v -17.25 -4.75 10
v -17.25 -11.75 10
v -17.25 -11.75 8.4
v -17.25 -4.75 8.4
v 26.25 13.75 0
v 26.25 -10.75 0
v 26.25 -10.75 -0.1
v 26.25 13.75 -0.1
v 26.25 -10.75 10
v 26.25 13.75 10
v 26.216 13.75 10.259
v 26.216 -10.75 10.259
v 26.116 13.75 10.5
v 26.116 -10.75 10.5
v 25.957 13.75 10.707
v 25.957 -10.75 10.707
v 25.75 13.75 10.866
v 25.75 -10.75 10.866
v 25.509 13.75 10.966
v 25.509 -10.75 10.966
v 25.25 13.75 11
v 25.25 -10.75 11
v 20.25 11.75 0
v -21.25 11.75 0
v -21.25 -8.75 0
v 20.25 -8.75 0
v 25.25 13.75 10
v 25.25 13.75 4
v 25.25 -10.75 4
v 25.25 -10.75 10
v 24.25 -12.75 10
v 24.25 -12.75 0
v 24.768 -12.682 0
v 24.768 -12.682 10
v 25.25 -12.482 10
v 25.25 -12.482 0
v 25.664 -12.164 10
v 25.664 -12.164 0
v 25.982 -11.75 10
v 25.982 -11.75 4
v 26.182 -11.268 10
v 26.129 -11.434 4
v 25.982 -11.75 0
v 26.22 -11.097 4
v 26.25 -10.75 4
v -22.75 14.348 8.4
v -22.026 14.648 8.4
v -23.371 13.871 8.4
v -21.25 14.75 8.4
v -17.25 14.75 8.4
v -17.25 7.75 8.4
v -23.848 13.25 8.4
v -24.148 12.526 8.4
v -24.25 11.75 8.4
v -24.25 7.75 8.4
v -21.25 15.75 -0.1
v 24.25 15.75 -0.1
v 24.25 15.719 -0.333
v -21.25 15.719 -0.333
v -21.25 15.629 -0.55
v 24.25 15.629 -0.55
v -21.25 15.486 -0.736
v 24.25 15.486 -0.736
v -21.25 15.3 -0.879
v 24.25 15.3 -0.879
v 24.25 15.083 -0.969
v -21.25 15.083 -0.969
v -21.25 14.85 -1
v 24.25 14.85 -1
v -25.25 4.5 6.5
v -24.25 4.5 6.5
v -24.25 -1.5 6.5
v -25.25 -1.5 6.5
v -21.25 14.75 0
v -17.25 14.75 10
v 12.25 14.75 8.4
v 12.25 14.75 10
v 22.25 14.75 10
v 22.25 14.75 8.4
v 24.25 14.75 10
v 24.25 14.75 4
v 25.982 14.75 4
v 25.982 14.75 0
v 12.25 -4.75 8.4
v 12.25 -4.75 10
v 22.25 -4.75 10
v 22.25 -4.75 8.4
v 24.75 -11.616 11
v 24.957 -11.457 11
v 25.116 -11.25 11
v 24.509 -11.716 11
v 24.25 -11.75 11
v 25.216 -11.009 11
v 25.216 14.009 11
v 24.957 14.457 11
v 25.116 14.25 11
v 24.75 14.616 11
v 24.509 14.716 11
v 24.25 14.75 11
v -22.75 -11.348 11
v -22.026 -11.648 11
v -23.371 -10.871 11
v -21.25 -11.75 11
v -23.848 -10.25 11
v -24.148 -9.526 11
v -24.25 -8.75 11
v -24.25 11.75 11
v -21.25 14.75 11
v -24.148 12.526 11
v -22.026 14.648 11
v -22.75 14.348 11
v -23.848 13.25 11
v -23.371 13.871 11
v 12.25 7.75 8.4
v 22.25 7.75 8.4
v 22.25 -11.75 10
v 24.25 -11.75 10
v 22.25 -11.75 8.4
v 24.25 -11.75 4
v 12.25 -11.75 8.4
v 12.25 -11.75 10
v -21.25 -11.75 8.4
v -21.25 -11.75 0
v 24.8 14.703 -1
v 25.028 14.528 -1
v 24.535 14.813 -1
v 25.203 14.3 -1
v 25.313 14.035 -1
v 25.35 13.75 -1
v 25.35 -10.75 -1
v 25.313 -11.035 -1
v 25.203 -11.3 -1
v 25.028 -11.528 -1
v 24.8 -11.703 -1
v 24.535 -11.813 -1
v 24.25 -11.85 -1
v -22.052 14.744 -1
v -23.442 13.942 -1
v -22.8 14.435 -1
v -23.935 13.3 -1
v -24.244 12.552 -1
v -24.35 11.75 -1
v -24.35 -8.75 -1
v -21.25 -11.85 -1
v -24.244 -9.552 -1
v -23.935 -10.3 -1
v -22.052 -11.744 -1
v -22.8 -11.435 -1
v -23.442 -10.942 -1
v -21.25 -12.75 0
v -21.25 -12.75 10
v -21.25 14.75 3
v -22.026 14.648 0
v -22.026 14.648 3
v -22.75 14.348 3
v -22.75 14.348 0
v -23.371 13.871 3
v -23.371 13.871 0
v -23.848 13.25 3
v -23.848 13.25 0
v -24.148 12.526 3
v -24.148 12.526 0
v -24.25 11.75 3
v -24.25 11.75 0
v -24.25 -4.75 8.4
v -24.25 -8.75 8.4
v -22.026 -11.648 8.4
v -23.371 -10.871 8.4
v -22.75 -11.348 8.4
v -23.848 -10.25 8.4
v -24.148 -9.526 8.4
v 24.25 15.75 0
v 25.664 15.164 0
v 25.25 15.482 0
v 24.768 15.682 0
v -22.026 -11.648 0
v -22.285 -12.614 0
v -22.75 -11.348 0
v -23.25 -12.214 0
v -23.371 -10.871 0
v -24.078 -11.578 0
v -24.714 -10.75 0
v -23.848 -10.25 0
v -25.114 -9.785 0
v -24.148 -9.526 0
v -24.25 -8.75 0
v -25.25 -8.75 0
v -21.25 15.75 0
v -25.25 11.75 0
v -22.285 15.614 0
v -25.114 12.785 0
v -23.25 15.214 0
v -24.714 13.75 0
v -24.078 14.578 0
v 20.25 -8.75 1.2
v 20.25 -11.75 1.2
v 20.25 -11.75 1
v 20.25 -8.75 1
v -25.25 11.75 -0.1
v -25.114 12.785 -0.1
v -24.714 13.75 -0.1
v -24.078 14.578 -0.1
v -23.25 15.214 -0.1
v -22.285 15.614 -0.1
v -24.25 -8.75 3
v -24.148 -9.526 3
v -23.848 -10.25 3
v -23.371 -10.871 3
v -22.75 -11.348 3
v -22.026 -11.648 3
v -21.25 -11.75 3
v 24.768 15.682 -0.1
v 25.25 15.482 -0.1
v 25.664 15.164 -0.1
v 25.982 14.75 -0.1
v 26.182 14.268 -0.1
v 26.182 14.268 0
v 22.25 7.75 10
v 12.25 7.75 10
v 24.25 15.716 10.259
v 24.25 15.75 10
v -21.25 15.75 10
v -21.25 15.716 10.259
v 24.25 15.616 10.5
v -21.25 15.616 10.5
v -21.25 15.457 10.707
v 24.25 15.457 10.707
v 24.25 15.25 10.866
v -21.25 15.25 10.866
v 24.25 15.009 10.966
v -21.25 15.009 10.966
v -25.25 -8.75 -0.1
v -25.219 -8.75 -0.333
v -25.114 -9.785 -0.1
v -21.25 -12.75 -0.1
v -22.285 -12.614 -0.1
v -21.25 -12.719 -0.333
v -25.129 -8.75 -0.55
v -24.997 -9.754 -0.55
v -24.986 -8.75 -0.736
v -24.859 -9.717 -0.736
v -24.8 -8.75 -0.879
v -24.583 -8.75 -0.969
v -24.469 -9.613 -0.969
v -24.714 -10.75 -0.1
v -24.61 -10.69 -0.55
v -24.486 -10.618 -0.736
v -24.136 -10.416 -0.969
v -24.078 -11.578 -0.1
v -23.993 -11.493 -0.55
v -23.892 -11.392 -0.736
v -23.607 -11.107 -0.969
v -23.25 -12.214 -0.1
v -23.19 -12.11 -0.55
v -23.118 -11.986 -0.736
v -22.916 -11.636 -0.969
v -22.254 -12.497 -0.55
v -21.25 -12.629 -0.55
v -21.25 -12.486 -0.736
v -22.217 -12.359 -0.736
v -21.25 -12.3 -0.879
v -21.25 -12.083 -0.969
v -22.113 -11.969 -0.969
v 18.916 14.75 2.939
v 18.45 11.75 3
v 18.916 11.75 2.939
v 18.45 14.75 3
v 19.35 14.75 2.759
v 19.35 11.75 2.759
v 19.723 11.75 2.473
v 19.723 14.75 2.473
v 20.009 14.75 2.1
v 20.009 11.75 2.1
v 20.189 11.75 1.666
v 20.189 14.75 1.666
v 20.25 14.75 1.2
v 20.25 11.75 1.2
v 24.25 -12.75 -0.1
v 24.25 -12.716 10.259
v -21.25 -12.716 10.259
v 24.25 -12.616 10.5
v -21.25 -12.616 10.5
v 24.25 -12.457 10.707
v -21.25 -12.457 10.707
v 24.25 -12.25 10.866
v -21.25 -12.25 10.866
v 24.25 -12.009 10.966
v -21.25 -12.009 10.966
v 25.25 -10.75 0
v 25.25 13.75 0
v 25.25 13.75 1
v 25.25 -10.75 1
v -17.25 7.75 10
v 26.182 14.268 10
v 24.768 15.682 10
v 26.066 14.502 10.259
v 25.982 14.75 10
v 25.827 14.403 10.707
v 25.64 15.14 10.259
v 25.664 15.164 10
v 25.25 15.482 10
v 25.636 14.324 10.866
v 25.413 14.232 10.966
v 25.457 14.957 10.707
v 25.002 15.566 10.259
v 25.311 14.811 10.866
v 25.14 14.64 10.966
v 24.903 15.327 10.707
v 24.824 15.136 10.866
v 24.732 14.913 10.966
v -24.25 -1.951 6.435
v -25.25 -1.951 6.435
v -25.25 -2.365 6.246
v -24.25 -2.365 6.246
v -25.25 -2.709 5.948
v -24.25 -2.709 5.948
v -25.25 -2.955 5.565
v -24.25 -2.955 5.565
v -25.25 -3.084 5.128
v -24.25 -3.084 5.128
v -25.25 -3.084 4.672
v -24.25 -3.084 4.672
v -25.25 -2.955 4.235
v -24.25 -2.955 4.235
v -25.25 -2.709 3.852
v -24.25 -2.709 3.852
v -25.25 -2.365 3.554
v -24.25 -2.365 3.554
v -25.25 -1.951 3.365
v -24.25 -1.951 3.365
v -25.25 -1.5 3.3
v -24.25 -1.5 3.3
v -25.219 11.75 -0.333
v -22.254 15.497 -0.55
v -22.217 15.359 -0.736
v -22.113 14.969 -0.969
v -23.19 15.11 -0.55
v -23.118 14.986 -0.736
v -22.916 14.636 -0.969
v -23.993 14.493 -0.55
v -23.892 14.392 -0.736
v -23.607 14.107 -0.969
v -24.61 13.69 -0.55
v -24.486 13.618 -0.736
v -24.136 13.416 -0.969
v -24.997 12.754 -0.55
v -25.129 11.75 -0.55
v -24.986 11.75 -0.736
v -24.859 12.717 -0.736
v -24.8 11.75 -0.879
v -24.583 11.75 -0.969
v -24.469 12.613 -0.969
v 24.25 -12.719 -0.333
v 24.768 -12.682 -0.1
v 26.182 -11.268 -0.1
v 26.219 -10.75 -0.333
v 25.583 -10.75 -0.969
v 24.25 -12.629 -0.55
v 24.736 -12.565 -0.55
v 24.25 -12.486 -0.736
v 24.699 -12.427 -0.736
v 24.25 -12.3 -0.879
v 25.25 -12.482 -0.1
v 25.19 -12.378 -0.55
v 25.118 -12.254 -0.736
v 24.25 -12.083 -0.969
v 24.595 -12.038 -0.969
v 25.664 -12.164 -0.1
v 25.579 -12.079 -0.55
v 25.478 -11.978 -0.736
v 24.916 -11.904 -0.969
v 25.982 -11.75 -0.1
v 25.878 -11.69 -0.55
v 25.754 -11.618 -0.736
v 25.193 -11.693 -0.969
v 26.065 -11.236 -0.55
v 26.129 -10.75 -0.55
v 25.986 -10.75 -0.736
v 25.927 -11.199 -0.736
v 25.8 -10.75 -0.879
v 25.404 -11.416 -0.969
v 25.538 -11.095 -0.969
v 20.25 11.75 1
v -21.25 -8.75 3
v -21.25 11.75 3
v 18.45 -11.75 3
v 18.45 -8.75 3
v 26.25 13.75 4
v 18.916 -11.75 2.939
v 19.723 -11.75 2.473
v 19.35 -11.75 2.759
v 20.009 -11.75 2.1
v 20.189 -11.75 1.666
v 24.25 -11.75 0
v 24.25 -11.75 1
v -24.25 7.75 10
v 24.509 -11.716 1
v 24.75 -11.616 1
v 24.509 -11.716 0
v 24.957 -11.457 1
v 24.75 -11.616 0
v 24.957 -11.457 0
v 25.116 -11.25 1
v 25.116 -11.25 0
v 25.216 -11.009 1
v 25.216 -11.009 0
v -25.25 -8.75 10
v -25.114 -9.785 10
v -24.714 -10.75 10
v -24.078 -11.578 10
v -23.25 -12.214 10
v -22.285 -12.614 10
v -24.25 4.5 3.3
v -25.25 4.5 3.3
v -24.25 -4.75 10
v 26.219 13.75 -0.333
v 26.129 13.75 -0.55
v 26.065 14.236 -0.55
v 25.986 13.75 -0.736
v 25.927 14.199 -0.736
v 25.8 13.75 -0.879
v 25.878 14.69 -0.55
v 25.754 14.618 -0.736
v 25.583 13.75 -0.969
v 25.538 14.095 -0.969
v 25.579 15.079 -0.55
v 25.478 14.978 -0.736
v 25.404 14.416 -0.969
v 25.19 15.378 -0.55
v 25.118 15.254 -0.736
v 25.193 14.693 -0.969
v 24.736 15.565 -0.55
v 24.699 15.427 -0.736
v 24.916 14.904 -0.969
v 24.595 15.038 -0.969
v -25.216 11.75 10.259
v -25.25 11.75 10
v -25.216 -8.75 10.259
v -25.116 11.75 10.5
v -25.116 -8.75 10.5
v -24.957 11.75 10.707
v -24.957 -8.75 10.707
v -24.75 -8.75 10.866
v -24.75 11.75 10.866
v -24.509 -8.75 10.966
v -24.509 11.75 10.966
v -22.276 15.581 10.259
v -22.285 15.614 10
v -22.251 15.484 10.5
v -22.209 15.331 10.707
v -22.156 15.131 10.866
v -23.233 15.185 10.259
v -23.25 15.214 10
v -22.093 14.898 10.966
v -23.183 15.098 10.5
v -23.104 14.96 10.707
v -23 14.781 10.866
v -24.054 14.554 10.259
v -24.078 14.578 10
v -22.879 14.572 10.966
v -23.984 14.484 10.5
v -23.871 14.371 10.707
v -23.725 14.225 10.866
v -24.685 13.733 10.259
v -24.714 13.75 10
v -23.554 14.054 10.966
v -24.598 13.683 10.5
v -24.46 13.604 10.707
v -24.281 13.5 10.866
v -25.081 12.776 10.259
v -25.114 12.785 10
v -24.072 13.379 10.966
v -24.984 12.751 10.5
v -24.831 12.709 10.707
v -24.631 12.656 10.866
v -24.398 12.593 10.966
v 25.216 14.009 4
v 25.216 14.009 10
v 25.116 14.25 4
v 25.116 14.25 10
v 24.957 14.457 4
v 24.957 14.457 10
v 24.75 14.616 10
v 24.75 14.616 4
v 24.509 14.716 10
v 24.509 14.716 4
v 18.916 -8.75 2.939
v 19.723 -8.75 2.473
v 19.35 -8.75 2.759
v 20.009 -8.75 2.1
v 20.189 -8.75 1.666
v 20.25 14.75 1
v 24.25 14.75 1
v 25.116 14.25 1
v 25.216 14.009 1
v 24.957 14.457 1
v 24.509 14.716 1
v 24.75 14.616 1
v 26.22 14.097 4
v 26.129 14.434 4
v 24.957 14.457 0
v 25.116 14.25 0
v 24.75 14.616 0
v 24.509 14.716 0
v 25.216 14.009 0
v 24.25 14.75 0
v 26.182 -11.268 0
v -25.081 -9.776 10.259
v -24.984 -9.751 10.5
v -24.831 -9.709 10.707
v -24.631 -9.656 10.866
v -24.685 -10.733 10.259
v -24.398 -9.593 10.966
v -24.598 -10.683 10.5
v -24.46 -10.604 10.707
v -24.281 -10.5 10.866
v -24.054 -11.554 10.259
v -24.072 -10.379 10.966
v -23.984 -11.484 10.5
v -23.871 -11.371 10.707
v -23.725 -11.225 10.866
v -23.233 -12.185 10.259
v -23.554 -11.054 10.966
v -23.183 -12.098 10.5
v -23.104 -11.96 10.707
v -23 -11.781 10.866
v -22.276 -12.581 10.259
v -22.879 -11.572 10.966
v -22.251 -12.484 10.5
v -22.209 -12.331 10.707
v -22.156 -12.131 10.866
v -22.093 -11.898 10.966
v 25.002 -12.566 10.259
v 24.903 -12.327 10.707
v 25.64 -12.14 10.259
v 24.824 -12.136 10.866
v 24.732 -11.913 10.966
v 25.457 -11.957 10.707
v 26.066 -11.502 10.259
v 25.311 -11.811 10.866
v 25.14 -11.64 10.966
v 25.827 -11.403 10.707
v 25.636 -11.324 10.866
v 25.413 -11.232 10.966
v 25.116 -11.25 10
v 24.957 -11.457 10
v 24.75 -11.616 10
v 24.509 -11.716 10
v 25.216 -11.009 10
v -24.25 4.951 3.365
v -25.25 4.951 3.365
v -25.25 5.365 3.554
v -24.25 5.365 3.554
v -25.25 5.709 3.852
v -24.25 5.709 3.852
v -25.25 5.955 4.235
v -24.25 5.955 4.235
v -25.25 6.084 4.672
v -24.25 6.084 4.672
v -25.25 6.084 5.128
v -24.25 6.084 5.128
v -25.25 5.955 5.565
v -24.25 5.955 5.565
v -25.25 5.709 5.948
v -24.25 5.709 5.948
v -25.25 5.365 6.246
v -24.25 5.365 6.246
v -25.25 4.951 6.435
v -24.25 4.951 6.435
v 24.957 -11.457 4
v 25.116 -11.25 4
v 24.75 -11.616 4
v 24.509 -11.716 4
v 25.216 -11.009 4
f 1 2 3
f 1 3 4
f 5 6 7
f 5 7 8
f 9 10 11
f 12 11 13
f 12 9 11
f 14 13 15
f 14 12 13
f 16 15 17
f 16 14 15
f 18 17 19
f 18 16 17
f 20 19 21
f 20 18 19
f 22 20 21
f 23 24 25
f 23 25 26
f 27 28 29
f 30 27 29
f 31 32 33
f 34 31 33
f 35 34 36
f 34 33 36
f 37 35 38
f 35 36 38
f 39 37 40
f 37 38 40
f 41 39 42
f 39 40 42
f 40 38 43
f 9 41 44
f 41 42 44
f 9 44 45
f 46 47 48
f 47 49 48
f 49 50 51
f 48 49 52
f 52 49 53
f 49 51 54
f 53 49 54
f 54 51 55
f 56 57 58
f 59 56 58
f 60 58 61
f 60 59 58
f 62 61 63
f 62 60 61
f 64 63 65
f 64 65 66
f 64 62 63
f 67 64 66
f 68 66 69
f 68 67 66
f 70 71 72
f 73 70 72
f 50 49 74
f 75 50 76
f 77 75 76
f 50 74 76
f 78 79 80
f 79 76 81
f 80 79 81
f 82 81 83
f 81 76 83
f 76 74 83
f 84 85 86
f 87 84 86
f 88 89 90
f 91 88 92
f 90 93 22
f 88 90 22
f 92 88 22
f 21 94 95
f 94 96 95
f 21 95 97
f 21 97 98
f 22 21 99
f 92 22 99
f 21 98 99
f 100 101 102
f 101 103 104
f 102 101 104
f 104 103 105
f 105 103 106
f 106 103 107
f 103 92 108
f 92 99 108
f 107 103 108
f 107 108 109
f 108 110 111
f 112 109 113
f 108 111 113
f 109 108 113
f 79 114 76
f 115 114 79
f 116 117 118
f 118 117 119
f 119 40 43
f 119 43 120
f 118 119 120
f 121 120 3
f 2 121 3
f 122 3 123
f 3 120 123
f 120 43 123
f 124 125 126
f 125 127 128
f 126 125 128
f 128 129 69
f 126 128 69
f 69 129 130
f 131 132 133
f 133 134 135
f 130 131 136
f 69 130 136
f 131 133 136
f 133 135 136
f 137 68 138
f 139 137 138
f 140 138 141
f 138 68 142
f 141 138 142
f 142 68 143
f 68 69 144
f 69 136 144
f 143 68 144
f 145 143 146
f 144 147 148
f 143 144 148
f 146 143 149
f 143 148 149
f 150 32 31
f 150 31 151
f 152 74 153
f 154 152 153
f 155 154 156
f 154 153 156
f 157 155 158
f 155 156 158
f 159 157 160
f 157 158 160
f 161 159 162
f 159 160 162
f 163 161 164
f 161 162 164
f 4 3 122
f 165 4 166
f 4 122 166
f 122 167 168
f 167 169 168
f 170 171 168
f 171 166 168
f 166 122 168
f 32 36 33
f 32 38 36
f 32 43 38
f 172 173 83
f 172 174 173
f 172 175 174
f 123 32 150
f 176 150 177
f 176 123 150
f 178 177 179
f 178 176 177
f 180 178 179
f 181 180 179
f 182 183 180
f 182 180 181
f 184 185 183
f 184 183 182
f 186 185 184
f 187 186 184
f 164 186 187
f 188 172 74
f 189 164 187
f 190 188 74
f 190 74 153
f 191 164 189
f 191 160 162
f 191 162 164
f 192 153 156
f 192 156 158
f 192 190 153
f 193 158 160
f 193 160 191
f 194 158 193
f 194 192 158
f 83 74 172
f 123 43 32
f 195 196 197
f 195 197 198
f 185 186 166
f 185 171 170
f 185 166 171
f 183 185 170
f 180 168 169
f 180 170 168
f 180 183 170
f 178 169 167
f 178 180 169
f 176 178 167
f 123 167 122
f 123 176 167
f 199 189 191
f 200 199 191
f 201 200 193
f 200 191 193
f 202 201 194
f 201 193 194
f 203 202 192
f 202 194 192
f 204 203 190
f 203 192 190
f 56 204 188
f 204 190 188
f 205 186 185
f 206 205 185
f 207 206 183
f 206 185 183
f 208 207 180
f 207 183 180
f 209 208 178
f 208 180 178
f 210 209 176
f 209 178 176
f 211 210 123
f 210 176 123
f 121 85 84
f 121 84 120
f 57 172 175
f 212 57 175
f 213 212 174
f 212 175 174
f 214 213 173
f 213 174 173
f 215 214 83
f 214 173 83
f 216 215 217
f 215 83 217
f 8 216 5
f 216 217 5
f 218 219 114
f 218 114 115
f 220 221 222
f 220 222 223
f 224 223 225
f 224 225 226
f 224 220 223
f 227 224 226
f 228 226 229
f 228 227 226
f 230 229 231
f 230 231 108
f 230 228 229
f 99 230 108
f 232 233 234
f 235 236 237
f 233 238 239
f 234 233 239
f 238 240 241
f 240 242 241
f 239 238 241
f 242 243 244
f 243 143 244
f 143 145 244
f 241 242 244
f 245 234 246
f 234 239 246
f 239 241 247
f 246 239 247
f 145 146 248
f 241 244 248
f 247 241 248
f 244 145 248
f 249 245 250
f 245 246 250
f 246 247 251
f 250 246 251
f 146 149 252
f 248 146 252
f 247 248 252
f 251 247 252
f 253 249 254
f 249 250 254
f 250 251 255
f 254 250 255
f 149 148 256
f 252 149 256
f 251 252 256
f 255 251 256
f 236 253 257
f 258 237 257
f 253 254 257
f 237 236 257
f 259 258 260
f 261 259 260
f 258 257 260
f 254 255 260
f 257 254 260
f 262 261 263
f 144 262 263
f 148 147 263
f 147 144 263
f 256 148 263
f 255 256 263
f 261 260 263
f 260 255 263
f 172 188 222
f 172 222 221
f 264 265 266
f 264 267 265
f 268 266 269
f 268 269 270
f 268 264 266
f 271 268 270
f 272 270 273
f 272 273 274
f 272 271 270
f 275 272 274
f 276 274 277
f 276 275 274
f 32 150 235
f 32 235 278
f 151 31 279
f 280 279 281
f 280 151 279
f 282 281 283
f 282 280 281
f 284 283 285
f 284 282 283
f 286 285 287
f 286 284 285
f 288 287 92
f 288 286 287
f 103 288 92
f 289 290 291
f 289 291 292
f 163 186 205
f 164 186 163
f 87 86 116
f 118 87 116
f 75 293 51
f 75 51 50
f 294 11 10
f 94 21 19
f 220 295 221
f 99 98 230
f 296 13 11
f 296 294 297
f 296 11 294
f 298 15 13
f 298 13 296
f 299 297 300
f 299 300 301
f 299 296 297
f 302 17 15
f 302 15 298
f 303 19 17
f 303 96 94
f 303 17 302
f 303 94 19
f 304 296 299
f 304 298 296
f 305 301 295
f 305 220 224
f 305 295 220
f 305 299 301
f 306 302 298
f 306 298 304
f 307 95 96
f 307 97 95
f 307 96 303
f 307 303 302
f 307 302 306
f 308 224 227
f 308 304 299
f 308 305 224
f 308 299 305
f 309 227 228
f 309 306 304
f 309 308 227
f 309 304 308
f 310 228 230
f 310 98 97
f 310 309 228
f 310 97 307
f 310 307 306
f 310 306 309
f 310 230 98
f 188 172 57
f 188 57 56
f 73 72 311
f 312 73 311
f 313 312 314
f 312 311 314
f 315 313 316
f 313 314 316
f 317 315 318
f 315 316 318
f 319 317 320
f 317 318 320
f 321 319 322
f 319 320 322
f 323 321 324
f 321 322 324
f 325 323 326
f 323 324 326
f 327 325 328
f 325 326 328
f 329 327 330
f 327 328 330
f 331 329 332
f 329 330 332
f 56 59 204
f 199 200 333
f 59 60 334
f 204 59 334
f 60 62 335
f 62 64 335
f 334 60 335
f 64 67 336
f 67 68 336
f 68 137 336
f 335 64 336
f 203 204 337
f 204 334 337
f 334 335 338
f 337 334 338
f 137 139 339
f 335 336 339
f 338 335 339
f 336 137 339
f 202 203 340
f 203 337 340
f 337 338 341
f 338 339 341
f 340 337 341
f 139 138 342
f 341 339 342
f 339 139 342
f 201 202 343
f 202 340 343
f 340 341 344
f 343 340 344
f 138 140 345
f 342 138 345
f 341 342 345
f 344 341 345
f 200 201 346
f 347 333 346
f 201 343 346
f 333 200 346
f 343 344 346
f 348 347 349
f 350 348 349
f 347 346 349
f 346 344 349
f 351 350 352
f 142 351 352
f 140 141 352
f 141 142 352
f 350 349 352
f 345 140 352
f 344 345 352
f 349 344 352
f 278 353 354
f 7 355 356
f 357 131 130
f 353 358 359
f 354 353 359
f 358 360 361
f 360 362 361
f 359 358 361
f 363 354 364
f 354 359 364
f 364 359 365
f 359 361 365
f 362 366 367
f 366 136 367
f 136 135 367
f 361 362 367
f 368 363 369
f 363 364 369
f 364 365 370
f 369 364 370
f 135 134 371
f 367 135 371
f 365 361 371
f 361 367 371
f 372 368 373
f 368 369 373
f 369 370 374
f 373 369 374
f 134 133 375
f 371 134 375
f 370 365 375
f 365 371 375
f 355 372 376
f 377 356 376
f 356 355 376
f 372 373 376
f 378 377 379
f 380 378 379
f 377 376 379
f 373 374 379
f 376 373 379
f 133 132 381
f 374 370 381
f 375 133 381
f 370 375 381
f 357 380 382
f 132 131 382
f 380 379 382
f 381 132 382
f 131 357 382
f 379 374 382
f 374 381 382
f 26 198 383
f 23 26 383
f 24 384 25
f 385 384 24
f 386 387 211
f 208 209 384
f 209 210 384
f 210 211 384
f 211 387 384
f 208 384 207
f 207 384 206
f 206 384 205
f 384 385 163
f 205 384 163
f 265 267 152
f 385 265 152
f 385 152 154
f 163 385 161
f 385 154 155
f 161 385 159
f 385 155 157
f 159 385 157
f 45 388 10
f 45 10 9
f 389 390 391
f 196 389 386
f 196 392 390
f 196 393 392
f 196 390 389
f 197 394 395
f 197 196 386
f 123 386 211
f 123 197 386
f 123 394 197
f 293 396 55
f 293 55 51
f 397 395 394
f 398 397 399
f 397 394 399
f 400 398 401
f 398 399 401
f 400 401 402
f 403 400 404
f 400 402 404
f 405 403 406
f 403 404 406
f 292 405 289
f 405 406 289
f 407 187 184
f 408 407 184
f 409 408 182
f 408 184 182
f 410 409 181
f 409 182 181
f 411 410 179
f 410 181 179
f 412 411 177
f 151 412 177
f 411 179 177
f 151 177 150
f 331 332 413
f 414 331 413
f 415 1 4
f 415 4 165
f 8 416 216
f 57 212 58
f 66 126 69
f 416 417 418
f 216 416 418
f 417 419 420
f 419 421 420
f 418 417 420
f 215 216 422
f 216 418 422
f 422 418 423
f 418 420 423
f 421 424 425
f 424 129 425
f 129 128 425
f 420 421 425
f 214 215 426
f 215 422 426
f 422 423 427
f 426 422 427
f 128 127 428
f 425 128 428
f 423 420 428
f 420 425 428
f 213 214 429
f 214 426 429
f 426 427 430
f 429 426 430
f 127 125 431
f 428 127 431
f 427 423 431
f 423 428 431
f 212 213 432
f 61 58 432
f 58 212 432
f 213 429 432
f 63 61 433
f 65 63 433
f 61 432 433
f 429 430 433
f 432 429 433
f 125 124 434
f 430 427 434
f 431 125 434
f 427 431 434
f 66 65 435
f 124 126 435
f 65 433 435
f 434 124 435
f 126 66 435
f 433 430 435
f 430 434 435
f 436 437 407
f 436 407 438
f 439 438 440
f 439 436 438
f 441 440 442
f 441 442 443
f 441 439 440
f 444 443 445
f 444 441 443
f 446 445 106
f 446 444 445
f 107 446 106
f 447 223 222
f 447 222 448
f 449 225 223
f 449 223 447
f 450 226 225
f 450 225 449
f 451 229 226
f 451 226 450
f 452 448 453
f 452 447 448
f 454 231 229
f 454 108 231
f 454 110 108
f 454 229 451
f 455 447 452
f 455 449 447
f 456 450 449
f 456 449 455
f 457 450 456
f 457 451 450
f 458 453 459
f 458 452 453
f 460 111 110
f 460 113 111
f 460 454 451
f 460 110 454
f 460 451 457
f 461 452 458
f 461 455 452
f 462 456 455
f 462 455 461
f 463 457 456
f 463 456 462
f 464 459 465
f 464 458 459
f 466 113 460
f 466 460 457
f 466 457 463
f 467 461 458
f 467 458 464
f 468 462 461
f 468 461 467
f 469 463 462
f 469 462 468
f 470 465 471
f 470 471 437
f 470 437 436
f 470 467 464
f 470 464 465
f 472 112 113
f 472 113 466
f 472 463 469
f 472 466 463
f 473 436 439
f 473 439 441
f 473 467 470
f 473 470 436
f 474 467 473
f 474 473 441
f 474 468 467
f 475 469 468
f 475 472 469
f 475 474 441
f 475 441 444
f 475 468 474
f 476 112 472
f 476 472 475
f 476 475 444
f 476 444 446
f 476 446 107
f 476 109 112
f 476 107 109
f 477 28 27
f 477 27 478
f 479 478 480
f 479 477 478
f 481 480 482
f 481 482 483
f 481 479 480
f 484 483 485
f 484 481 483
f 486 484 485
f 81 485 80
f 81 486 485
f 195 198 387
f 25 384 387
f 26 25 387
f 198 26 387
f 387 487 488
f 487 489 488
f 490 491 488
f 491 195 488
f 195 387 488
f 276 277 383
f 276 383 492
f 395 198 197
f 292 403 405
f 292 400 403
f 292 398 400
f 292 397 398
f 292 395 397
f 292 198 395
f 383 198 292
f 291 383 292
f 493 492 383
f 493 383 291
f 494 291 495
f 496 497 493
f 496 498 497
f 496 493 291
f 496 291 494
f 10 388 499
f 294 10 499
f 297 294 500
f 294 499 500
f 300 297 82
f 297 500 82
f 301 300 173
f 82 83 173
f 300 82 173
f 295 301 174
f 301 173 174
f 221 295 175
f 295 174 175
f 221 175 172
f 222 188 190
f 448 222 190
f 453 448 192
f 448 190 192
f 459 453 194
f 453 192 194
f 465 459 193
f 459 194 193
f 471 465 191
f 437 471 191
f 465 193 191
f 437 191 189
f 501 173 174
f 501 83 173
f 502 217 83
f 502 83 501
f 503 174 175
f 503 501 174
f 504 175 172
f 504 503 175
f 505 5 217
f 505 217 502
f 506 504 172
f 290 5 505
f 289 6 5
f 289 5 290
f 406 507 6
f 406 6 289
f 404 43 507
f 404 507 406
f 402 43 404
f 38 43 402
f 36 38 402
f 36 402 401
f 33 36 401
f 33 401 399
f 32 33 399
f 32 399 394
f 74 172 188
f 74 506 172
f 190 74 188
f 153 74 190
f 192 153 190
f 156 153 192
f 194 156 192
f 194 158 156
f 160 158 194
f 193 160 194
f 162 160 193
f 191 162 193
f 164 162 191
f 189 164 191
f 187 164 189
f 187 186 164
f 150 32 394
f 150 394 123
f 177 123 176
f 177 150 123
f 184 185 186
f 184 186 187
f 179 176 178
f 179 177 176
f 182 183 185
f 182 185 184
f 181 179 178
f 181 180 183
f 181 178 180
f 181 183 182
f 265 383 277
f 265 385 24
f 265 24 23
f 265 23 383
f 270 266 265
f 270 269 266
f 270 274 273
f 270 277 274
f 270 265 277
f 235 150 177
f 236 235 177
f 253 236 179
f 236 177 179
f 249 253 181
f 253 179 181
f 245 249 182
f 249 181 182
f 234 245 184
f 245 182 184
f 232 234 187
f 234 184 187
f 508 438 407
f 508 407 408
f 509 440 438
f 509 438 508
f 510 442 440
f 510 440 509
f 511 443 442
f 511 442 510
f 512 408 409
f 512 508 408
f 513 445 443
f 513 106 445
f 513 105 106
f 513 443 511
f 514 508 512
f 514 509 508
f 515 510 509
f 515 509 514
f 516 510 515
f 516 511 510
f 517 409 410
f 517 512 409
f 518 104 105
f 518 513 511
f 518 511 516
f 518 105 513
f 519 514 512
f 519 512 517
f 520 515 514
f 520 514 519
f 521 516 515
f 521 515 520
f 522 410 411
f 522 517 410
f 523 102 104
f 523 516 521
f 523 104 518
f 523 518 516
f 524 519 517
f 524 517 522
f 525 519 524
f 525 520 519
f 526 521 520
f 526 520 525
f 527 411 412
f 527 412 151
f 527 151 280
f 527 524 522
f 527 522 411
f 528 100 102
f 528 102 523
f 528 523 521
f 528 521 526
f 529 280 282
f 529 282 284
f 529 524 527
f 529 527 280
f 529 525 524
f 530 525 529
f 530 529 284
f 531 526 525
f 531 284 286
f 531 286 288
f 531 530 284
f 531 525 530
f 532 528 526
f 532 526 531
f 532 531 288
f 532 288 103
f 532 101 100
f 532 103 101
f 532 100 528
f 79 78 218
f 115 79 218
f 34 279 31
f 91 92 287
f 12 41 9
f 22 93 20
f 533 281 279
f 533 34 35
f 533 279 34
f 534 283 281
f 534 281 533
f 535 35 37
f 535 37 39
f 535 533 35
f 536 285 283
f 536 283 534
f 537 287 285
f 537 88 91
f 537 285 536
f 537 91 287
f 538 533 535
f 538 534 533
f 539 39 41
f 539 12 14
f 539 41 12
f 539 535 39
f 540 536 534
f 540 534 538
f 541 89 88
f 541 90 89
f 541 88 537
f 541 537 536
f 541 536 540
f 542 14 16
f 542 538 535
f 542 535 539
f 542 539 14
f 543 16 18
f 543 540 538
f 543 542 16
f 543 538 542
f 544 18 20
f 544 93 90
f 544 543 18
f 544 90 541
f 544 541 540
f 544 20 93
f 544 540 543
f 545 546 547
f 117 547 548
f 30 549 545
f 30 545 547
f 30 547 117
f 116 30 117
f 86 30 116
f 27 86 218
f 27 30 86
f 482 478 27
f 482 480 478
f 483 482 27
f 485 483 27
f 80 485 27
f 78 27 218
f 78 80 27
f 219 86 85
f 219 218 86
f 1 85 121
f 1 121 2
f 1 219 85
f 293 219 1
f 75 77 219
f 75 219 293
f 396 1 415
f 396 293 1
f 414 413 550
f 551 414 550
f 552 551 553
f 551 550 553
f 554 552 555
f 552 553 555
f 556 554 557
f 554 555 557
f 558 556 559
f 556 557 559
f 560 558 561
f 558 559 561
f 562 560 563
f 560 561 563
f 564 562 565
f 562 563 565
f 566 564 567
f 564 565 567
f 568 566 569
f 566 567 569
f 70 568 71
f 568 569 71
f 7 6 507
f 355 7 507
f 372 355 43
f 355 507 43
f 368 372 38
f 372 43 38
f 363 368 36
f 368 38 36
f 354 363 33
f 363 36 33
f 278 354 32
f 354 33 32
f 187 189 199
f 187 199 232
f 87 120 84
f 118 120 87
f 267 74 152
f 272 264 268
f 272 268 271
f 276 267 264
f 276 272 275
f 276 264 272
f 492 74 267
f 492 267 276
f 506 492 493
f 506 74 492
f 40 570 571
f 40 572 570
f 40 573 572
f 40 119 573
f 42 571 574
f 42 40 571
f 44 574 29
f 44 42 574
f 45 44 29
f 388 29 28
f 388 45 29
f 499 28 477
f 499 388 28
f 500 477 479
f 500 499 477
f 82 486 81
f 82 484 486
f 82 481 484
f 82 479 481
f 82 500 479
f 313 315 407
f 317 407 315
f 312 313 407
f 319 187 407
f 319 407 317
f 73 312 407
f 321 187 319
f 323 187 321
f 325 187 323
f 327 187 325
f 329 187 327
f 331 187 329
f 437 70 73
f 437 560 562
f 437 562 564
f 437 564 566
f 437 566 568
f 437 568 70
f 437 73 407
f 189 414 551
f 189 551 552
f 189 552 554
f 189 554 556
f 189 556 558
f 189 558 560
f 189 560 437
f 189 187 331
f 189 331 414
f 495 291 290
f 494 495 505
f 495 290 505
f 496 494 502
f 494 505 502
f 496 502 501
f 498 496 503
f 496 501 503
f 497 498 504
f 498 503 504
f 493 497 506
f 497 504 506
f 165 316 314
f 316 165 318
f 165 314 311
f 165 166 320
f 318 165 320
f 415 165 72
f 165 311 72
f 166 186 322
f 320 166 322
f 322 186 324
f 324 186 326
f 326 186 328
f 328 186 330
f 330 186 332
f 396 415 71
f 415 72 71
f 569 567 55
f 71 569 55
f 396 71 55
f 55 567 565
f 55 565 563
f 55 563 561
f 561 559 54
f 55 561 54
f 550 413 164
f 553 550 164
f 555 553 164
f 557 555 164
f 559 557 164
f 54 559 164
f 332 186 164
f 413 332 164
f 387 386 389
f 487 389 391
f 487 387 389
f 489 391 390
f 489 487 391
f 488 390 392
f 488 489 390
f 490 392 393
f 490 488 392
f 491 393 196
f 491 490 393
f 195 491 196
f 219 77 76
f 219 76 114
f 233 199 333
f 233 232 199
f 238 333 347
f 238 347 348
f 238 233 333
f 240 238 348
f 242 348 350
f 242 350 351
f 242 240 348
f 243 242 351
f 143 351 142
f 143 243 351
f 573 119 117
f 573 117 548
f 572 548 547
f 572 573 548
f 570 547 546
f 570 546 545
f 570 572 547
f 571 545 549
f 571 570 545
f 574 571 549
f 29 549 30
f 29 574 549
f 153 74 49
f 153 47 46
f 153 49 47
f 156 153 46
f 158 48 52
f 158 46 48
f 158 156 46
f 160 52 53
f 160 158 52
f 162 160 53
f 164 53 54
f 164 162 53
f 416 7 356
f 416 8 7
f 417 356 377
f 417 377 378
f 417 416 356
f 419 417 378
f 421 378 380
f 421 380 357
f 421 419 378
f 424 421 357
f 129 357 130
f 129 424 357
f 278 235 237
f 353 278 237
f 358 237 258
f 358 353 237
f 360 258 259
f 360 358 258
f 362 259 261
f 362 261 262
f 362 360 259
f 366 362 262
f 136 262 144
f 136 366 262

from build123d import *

# Parameters (mm, degrees)
PAD_DEPTH       = 10
THICKNESS_T     = 1
SKETCH001_W     = 10
SKETCH001_H     = 7
PAD001_DEPTH    = 1.6
SKETCH002_W     = 24.5
SKETCH002_H     = 4
POCKET_DEPTH    = 1
POCKET001_DEPTH = 5
SKETCH006_W     = 26.5
SKETCH006_H     = 4
POCKET002_DEPTH = 5
PAD002_DEPTH    = 3
PAD003_DEPTH    = 1
SKETCH007_W     = 41.5
SKETCH007_H     = 20.5
POCKET003_DEPTH = 3
SKETCH008_W     = 5
SKETCH008_H     = 26.5
POCKET004_DEPTH = 2
FILLET_R        = 1.8
FILLET001_R     = 0.9


with BuildPart() as bottom:
    # Sketch → Pad (new body)
    with BuildSketch(Plane.XY):
        with BuildLine():
            Line((-21.25, 14.75), (24.25, 14.75))
            ThreePointArc((25.25, 13.75), (24.957107, 14.457107), (24.25, 14.75))
            Line((25.25, 13.75), (25.25, -10.75))
            ThreePointArc((24.25, -11.75), (24.957107, -11.457107), (25.25, -10.75))
            Line((24.25, -11.75), (-21.25, -11.75))
            ThreePointArc((-24.25, -8.75), (-23.37132, -10.87132), (-21.25, -11.75))
            Line((-24.25, -8.75), (-24.25, 11.75))
            ThreePointArc((-21.25, 14.75), (-23.37132, 13.87132), (-24.25, 11.75))
        make_face()
    extrude(amount=PAD_DEPTH)

    # Thickness
    thickness_openings = [bottom.faces().sort_by_distance(p)[0] for p in [
        (0.563092, 1.5, 0),
    ]]
    offset(amount=THICKNESS_T, openings=thickness_openings)

    # Sketch001 (on Face9 of Thickness) → Pad001 (join)
    with BuildSketch(Plane(origin=(0, 0, 10), x_dir=(1, 0, 0), z_dir=(0, 0, -1))):
        with BuildLine():
            Line((-21.25, 11.75), (-17.25, 11.75))
            Line((-17.25, 11.75), (-17.25, 4.75))
            Line((-17.25, 4.75), (-24.25, 4.75))
            Line((-24.25, 4.75), (-24.25, 8.75))
            ThreePointArc((-21.25, 11.75), (-23.37132, 10.87132), (-24.25, 8.75))
        make_face()
        with BuildLine():
            Line((-24.25, -7.75), (-17.25, -7.75))
            Line((-17.25, -7.75), (-17.25, -14.75))
            Line((-17.25, -14.75), (-21.25, -14.75))
            ThreePointArc((-24.25, -11.75), (-23.37132, -13.87132), (-21.25, -14.75))
            Line((-24.25, -11.75), (-24.25, -7.75))
        make_face()
        with Locations((17.25, -11.25)):
            Rectangle(SKETCH001_W, SKETCH001_H)
        with Locations((17.25, 8.25)):
            Rectangle(SKETCH001_W, SKETCH001_H)
    extrude(amount=PAD001_DEPTH)

    # Sketch002 (on Face11 of Pad001) → Pocket (cut)
    with BuildSketch(Plane(origin=(25.25, 0, 0), x_dir=(0, -1, 0), z_dir=(-1, 0, 0))):
        with Locations((-1.5, 2)):
            Rectangle(SKETCH002_W, SKETCH002_H)
    extrude(amount=-POCKET_DEPTH, mode=Mode.SUBTRACT)

    # Sketch003 (on Face11 of Pocket) → Pocket001 (cut)
    with BuildSketch(Plane.YZ.offset(-24.25)):
        with BuildLine():
            ThreePointArc((-1.5, 6.5), (-3.1, 4.9), (-1.5, 3.3))
            Line((-1.5, 3.3), (4.5, 3.3))
            ThreePointArc((4.5, 3.3), (6.1, 4.9), (4.5, 6.5))
            Line((4.5, 6.5), (-1.5, 6.5))
        make_face()
    extrude(amount=-POCKET001_DEPTH, mode=Mode.SUBTRACT)

    # Sketch006 (on Face40 of Pocket001) → Pocket002 (cut)
    with BuildSketch(Plane.YZ.offset(26.25)):
        with Locations((1.5, 2)):
            Rectangle(SKETCH006_W, SKETCH006_H)
    extrude(amount=-POCKET002_DEPTH, mode=Mode.SUBTRACT)


with BuildPart() as top:
    # Sketch004 → Pad002 (new body)
    with BuildSketch(Plane.XY):
        with BuildLine():
            Line((-21.25, 14.75), (24.25, 14.75))
            ThreePointArc((25.25, 13.75), (24.957107, 14.457107), (24.25, 14.75))
            Line((25.25, 13.75), (25.25, -10.75))
            ThreePointArc((24.25, -11.75), (24.957107, -11.457107), (25.25, -10.75))
            Line((24.25, -11.75), (-21.25, -11.75))
            ThreePointArc((-24.25, -8.75), (-23.37132, -10.87132), (-21.25, -11.75))
            Line((-24.25, -8.75), (-24.25, 11.75))
            ThreePointArc((-21.25, 14.75), (-23.37132, 13.87132), (-24.25, 11.75))
        make_face()
    extrude(amount=PAD002_DEPTH)

    # Sketch005 (on Face9 of Pad002) → Pad003 (join)
    with BuildSketch(Plane(origin=(0, 0, 0), x_dir=(1, 0, 0), z_dir=(0, 0, -1))):
        with BuildLine():
            Line((-21.25, 12.75), (24.25, 12.75))
            ThreePointArc((26.25, 10.75), (25.664214, 12.164214), (24.25, 12.75))
            Line((26.25, 10.75), (26.25, -13.75))
            ThreePointArc((24.25, -15.75), (25.664214, -15.164214), (26.25, -13.75))
            Line((24.25, -15.75), (-21.25, -15.75))
            ThreePointArc((-25.25, -11.75), (-24.078427, -14.578427), (-21.25, -15.75))
            Line((-25.25, -11.75), (-25.25, 8.75))
            ThreePointArc((-21.25, 12.75), (-24.078427, 11.578427), (-25.25, 8.75))
        make_face()
    extrude(amount=PAD003_DEPTH)

    # Sketch007 (on Face19 of Pad003) → Pocket003 (cut)
    with BuildSketch(Plane.XY.offset(3)):
        with Locations((-0.5, 1.5)):
            Rectangle(SKETCH007_W, SKETCH007_H)
    extrude(amount=-POCKET003_DEPTH, mode=Mode.SUBTRACT)

    # Sketch008 (on Face19 of Pocket003) → Pocket004 (cut)
    with BuildSketch(Plane.XY.offset(3)):
        with Locations((22.75, 1.5)):
            Rectangle(SKETCH008_W, SKETCH008_H)
    extrude(amount=-POCKET004_DEPTH, mode=Mode.SUBTRACT)

    # Fillet
    fillet_edges = [top.edges().sort_by_distance(p)[0] for p in [
        (20.25, 13.25, 3),
        (20.25, -10.25, 3),
    ]]
    fillet(fillet_edges, radius=FILLET_R)

    # Fillet001
    fillet001_edges = [top.edges().sort_by_distance(p)[0] for p in [
        (1.5, 15.75, -1),
    ]]
    fillet(fillet001_edges, radius=FILLET001_R)


solid = Compound([bottom.part, top.part])
